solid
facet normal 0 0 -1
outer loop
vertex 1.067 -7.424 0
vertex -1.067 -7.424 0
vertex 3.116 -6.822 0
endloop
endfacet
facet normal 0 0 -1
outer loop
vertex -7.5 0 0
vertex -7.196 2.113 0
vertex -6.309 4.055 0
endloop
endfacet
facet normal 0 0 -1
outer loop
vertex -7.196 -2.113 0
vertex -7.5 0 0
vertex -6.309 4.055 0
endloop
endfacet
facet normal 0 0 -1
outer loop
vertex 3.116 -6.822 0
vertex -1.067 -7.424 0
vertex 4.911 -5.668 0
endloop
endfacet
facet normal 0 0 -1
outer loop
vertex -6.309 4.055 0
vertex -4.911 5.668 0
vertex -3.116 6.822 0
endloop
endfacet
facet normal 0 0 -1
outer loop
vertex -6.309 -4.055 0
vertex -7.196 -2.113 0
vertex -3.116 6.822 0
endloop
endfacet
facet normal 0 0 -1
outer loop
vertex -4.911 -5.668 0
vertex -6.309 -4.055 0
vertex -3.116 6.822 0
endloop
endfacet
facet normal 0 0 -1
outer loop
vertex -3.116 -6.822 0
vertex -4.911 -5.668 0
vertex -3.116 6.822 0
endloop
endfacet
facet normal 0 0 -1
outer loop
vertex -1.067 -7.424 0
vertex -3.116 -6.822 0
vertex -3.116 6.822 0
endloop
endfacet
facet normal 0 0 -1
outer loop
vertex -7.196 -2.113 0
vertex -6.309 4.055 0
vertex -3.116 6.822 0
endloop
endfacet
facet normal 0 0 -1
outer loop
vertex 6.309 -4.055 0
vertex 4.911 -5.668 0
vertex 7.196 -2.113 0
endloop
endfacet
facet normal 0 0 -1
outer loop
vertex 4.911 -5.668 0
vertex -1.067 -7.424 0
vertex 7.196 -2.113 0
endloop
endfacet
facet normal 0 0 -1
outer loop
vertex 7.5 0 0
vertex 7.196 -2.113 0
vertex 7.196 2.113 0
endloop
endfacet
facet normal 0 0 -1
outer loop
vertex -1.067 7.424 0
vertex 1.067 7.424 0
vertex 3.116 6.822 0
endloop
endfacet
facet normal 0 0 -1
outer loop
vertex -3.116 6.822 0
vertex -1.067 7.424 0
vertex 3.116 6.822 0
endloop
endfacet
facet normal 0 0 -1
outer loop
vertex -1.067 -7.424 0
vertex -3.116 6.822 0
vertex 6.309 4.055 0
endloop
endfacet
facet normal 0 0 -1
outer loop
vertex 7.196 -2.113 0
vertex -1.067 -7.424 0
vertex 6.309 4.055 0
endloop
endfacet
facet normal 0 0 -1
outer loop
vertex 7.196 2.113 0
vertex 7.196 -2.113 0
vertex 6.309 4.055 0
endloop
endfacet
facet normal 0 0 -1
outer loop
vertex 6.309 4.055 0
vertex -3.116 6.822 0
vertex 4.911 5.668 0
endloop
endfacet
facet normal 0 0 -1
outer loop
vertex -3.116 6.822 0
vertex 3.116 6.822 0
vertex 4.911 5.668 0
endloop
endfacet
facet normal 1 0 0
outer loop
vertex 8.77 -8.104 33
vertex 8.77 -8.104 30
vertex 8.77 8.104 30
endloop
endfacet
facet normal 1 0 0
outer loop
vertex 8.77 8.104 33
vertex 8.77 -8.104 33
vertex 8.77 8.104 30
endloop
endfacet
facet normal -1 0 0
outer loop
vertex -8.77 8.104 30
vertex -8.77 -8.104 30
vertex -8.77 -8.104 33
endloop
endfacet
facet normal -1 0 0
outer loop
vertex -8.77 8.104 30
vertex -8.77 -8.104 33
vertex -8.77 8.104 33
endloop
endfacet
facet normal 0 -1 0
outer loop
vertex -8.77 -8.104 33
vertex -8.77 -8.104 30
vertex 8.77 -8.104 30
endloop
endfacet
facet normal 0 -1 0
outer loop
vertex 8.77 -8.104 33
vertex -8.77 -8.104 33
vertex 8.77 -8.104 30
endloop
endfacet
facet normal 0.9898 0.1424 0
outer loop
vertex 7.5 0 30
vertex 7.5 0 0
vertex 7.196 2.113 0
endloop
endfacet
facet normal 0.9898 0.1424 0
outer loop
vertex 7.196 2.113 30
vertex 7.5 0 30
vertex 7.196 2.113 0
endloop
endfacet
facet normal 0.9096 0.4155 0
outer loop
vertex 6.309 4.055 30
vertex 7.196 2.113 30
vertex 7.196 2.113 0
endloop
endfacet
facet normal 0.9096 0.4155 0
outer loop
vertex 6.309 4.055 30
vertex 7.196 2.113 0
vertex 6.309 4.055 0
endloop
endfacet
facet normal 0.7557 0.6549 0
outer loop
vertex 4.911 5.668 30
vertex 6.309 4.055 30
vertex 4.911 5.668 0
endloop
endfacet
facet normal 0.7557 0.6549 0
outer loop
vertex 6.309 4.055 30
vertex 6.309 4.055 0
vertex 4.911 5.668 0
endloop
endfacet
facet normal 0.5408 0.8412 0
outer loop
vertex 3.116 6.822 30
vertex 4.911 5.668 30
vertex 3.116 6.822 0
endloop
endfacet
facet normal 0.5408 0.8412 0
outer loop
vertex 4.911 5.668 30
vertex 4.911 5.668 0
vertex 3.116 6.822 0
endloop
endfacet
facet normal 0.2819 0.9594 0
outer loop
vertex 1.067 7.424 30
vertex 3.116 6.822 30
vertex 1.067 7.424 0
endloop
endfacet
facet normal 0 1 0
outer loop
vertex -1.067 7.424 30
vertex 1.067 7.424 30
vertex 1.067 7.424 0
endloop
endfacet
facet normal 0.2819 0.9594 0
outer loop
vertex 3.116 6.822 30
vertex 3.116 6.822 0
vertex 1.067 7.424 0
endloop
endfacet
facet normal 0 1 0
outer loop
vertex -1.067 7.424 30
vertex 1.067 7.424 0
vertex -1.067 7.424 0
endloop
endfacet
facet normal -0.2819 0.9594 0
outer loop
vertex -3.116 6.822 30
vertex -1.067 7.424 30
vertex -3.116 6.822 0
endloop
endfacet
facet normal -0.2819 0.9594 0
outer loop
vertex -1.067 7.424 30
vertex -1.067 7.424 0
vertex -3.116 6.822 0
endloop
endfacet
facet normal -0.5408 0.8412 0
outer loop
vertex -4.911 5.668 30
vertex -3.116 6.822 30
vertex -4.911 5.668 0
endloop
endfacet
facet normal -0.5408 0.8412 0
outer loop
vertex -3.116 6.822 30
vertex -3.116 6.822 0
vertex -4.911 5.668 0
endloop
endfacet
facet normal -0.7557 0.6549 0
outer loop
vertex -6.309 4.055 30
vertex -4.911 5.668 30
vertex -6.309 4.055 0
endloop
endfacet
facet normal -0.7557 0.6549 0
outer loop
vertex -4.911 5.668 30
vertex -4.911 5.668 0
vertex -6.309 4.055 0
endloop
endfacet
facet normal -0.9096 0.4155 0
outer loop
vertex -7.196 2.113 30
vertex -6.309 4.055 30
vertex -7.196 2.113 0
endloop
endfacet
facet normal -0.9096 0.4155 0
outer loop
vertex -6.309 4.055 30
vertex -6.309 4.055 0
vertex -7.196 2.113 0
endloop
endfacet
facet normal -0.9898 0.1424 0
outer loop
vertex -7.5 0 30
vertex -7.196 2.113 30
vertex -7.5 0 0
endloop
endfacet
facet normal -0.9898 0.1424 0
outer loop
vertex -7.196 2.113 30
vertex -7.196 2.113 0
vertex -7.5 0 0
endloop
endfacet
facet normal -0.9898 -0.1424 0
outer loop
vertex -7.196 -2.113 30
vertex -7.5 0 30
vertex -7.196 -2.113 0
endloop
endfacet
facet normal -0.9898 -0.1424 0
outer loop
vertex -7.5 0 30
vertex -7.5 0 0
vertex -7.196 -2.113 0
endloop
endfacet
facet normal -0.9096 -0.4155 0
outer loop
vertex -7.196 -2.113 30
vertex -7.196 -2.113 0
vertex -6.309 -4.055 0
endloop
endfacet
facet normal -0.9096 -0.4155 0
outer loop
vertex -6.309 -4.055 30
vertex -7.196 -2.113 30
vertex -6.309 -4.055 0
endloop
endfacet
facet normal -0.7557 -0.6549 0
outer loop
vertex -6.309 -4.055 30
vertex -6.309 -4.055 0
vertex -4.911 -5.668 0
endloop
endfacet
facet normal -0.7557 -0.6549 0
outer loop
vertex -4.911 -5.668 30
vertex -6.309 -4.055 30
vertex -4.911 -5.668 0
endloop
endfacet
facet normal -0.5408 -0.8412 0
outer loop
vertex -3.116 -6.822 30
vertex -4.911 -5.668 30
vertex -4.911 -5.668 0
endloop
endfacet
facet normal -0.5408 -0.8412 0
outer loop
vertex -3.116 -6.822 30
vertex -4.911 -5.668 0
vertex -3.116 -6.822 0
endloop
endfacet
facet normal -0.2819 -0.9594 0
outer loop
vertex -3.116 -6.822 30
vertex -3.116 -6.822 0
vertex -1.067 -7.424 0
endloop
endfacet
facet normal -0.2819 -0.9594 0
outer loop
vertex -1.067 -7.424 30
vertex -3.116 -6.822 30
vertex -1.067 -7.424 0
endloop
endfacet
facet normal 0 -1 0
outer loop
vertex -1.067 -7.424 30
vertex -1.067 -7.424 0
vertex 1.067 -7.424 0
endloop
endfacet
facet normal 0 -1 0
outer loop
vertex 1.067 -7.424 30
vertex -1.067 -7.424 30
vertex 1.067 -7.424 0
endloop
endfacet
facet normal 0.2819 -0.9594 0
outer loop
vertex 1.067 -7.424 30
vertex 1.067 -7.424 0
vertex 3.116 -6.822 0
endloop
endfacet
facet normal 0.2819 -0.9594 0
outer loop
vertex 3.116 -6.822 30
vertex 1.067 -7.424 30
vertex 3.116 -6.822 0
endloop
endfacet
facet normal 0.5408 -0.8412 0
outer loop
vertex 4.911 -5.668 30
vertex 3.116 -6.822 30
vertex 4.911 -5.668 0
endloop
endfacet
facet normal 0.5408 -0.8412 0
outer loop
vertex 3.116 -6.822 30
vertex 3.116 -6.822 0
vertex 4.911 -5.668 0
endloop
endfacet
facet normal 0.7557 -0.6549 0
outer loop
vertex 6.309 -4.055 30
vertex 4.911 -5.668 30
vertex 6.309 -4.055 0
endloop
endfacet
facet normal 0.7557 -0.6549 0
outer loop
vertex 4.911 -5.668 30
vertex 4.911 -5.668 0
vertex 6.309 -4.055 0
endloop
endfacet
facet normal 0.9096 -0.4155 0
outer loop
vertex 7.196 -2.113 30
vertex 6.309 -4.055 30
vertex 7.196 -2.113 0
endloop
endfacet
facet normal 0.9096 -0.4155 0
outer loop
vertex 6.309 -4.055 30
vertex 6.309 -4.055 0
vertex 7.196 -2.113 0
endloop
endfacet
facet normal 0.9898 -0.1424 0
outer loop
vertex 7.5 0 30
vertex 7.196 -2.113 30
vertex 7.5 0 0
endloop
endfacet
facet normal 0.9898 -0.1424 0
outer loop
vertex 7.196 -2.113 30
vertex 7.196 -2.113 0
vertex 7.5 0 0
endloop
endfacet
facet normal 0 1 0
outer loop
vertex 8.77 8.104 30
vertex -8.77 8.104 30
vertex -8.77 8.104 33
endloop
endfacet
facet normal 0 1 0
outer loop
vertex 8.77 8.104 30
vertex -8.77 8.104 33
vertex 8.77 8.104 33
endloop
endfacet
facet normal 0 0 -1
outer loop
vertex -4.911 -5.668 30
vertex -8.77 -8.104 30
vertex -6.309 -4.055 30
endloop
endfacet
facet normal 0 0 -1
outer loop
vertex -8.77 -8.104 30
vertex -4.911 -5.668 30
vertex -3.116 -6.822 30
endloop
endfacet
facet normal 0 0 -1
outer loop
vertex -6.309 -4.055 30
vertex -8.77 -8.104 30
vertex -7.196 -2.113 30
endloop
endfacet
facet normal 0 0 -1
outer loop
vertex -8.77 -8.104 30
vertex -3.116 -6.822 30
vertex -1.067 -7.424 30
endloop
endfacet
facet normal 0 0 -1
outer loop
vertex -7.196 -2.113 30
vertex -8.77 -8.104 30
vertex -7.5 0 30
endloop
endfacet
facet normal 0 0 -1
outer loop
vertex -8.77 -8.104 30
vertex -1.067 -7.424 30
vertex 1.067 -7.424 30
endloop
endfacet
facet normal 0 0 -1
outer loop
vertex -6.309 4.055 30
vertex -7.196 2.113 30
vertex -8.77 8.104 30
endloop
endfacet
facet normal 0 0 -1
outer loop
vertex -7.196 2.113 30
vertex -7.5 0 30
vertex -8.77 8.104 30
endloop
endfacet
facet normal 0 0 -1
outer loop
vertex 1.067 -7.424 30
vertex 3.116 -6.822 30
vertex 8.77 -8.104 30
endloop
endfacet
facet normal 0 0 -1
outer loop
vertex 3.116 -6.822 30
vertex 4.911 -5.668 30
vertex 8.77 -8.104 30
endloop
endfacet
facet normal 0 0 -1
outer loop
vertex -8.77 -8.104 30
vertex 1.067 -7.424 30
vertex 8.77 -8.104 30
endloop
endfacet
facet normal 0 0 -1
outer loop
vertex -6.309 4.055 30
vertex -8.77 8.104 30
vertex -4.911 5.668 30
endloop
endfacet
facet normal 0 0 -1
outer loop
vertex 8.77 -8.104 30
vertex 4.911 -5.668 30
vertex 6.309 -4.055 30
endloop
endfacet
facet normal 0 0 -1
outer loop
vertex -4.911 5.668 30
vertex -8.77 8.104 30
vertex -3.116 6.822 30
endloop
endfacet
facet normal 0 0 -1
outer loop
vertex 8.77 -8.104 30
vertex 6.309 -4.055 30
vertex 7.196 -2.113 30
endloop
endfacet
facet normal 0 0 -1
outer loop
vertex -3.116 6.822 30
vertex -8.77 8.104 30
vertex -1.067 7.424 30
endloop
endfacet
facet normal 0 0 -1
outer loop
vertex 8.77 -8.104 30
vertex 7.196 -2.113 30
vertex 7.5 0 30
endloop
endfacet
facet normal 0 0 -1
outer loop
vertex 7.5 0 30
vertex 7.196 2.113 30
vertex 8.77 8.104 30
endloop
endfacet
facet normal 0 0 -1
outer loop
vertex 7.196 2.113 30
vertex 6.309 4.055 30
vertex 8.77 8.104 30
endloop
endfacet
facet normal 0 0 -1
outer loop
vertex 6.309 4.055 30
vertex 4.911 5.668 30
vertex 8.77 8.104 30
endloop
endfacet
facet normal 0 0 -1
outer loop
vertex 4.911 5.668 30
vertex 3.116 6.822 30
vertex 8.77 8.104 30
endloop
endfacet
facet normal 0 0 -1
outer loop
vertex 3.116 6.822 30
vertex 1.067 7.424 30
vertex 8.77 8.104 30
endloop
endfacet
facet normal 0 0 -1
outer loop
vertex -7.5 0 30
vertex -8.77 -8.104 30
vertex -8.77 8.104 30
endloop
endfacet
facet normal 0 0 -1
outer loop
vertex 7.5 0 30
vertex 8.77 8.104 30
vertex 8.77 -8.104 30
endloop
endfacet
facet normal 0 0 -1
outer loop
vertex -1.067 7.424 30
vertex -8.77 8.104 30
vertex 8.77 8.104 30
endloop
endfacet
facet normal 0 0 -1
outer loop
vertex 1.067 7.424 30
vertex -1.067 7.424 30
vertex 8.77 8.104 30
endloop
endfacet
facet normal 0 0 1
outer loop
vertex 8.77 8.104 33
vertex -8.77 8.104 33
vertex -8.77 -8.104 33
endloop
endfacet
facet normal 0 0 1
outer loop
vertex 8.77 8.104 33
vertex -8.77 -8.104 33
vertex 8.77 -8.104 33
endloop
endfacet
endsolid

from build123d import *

# Parameters (mm, degrees)
SKETCH_R     = 7.5
PAD_DEPTH    = 30
SKETCH001_W  = 17.539976
SKETCH001_H  = 16.208446
PAD001_DEPTH = 3


with BuildPart() as part:
    # Sketch → Pad (new body)
    with BuildSketch(Plane.XY):
        Circle(SKETCH_R)
    extrude(amount=PAD_DEPTH)

    # Sketch001 → Pad001 (join)
    with BuildSketch(Plane.XY.offset(30)):
        Rectangle(SKETCH001_W, SKETCH001_H)
    extrude(amount=PAD001_DEPTH)


solid = part.part
